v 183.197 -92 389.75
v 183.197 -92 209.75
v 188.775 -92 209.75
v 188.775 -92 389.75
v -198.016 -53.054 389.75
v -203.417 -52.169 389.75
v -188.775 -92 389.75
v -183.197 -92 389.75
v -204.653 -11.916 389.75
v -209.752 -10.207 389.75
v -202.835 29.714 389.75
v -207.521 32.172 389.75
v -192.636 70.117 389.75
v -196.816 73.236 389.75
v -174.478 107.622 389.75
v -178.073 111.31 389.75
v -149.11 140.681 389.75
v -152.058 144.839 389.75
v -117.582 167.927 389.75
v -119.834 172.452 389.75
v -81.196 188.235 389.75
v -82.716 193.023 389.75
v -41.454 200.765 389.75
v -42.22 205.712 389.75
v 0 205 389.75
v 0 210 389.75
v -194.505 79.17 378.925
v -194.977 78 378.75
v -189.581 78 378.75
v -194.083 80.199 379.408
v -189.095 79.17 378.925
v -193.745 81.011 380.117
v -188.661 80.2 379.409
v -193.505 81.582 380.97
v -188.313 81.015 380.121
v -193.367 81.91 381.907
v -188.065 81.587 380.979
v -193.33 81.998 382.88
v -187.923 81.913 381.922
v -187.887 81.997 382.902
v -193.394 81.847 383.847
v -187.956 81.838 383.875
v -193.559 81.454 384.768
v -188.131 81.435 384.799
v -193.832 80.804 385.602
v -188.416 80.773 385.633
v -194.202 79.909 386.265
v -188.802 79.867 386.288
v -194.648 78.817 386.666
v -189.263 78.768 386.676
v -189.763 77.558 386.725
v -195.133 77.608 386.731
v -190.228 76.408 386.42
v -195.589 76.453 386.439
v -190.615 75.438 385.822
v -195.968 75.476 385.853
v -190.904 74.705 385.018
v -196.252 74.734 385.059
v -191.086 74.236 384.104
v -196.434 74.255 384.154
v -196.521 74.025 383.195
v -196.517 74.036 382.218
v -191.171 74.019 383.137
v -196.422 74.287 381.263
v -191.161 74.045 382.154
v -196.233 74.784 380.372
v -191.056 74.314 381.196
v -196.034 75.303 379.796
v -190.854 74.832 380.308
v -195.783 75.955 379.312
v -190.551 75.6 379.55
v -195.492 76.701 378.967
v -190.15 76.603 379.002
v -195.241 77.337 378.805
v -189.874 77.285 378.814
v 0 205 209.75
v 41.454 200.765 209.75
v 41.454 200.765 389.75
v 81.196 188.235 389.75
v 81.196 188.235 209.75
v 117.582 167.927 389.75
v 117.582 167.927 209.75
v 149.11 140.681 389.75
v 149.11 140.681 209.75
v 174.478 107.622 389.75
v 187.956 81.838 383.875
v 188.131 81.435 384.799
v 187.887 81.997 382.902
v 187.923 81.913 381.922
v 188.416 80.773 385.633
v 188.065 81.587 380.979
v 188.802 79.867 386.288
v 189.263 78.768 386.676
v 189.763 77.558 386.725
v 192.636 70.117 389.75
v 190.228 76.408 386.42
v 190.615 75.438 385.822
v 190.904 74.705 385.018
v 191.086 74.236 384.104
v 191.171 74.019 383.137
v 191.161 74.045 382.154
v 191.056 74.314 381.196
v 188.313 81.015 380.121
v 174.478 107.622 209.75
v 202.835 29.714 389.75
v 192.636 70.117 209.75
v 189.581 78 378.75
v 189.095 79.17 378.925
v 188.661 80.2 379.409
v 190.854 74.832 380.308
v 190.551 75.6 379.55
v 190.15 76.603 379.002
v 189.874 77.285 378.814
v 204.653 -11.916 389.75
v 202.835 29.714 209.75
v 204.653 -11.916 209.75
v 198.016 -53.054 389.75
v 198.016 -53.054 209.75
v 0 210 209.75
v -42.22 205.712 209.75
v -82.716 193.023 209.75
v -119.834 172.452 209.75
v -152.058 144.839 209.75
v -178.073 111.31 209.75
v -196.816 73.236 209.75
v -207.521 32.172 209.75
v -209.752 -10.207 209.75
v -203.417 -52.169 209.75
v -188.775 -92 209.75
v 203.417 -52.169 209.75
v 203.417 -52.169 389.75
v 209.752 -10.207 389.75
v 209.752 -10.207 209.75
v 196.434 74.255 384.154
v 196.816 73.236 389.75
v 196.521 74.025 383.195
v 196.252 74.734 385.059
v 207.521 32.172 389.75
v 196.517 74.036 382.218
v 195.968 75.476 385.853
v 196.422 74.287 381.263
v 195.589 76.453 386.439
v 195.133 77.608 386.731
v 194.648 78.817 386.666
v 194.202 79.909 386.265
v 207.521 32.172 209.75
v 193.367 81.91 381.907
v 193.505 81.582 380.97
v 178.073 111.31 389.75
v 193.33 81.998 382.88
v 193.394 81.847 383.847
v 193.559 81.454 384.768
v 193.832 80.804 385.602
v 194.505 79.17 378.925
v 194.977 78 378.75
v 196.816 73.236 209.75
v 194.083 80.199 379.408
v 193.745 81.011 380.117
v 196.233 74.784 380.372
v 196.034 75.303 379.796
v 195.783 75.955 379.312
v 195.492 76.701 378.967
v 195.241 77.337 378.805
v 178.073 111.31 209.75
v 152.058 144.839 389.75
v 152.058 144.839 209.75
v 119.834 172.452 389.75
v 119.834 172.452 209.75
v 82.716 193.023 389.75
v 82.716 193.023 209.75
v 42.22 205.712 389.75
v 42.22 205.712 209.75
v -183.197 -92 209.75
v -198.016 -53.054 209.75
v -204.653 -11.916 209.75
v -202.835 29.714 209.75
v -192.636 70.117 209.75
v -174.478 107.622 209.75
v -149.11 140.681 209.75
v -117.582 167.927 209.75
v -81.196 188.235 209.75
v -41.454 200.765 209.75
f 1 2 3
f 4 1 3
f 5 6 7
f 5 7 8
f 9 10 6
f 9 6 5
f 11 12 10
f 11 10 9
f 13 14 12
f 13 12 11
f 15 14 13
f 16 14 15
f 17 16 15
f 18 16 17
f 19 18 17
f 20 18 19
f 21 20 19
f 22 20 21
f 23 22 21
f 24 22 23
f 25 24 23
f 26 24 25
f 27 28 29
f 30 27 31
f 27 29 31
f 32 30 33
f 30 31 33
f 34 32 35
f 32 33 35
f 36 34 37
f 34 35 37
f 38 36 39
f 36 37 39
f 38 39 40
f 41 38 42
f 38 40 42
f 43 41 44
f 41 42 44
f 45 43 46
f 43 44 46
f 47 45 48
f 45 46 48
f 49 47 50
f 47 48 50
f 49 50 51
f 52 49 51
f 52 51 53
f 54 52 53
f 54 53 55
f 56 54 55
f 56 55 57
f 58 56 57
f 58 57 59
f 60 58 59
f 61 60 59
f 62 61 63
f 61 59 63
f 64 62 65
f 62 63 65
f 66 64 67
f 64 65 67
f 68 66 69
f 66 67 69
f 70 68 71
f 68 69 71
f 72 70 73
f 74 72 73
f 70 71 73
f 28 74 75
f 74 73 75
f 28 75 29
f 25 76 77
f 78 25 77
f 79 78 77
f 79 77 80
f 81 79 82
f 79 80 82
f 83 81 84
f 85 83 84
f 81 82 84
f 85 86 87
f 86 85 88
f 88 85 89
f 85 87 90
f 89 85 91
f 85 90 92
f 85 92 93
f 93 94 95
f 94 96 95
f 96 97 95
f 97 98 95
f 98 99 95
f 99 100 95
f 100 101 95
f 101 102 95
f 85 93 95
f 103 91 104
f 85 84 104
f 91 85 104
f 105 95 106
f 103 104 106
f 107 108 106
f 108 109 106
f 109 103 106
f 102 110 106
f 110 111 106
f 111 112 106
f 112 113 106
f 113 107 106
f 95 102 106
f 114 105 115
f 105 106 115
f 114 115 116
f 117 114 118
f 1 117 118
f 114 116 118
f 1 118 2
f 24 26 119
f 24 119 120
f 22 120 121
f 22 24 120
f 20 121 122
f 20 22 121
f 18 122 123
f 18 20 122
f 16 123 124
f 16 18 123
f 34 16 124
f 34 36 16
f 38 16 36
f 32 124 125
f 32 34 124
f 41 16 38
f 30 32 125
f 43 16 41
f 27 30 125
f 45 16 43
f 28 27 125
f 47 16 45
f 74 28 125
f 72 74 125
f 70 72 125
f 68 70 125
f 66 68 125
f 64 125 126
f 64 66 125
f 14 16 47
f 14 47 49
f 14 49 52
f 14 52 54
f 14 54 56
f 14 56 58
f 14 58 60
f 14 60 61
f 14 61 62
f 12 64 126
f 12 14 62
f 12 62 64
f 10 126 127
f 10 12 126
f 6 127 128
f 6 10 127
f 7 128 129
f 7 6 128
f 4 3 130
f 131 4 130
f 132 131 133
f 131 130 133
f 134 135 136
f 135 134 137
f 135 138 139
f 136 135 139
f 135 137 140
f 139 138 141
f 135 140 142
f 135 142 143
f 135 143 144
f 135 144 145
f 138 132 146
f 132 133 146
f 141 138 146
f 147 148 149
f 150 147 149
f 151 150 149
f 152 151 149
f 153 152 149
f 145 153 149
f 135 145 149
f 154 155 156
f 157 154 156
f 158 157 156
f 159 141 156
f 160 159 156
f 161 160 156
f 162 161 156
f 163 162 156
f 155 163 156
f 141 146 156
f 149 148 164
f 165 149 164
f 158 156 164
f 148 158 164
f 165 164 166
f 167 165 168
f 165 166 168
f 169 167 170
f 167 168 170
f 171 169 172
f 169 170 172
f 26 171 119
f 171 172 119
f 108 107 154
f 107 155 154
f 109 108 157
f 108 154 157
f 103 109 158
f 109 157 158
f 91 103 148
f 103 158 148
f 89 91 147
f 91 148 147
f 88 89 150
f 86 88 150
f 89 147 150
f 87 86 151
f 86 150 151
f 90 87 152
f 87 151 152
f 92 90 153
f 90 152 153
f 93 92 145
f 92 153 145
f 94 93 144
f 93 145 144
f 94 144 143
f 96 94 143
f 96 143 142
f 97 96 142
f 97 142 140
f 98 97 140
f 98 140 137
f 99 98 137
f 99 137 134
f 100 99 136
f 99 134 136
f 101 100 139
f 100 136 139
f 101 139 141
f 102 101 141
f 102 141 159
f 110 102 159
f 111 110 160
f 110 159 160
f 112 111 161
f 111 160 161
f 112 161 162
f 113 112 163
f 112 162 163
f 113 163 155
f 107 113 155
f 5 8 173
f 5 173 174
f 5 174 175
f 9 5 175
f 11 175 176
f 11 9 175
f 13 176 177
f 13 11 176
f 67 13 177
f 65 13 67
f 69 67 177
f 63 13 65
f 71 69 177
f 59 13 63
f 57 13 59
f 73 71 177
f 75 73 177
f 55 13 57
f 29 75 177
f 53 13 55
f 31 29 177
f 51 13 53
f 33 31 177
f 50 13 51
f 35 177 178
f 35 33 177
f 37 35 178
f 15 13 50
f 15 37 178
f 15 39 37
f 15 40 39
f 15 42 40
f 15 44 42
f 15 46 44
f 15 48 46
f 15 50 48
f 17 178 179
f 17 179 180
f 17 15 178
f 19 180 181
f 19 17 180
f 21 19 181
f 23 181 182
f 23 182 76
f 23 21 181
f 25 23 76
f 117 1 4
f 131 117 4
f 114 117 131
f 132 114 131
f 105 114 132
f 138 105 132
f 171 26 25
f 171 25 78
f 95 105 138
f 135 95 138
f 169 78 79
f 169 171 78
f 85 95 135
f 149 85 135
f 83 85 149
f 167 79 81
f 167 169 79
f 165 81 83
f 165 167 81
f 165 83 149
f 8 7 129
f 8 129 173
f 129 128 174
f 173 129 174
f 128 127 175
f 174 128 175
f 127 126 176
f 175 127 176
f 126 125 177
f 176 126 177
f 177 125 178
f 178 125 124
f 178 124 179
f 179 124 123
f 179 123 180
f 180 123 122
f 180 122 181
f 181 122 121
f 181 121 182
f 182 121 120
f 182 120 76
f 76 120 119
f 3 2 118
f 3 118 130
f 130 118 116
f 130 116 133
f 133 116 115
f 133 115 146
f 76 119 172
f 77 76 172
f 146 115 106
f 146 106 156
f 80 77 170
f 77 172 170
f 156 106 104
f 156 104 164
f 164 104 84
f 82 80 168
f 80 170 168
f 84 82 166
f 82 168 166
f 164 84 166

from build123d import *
from build123d.topology import SkipClean

# Parameters (mm, degrees)
SKETCH_1_R          = 210
SKETCH_1_R_2        = 203
EXTRUDE_2_DEPTH     = 174
EXTRUDE_START       = -174
EXTRUDE_4_DEPTH     = 174
CUT_EXTRUDE_1_DEPTH = 654
EXTRUDE_5_DEPTH     = 174
EXTRUDE_6_DEPTH     = 174
EXTRUDE_7_DEPTH     = 174
EXTRUDE_8_DEPTH     = 174
CUT_EXTRUDE_START   = -654
CUT_EXTRUDE_2_DEPTH = 654
SKETCH_10_W         = 20.487801248
SKETCH_10_H         = 174
CUT_EXTRUDE_3_DEPTH = 327
SKETCH_11_W         = 235.63772895
SKETCH_11_H         = 249.192111589
CUT_EXTRUDE_4_DEPTH = 238
EXTRUDE_10_DEPTH    = 180
SKETCH_17_W         = 286.098661696
SKETCH_17_H         = 191.878669743
CUT_EXTRUDE_5_DEPTH = 322
EXTRUDE_11_DEPTH    = 180
SKETCH_20_R         = 4
CUT_EXTRUDE_7_DEPTH = 555.5


with BuildPart() as part:
    # 草图1 → 凸台-拉伸2 (new body)
    with BuildSketch(Plane.XY):
        Circle(SKETCH_1_R)
        Circle(SKETCH_1_R_2, mode=Mode.SUBTRACT)
    extrude(amount=EXTRUDE_2_DEPTH)

    # 草图2 → 凸台-拉伸4 (add)
    with BuildSketch(Plane.XY.offset(174).offset(EXTRUDE_START)):
        with BuildLine():
            Line((-170.735431044, -102), (-173.735431044, -102))
            Line((-173.735431044, -102), (-175.513532242, -102))
            ThreePointArc((-175.513532242, -102), (-174.63092392, -103.50381834), (-173.735431044, -105))
            Line((-173.735431044, -105), (-170.735431044, -105))
            Line((-170.735431044, -105), (-170.735431044, -102))
        make_face()
        with BuildLine():
            ThreePointArc((173.735431044, -105), (174.63092392, -103.50381834), (175.513532242, -102))
            Line((175.513532242, -102), (173.735431044, -102))
            Line((173.735431044, -102), (170.735431044, -102))
            Line((170.735431044, -102), (170.735431044, -105))
            Line((170.735431044, -105), (173.735431044, -105))
        make_face()
    extrude(amount=EXTRUDE_4_DEPTH)

    # 草图3 → 切除-拉伸1 (cut)
    with BuildSketch(Plane.XY.offset(174)):
        Polygon((-170.735431044, -102), (238.333646515, -102), (254.334169784, 272.292523591), (-334.569415043, 221.85110305), (-306.830562533, -102), align=None)
    extrude(amount=-CUT_EXTRUDE_1_DEPTH, mode=Mode.SUBTRACT)

    # 草图5 → 凸台-拉伸5 (add)
    with BuildSketch(Plane.XY.offset(174).offset(EXTRUDE_START)):
        with BuildLine():
            Line((-120, -209.75), (-10.243900624, -209.75))
            ThreePointArc((-10.243900624, -209.75), (-67.755470707, -198.769203322), (-120, -172.336879396))
            Line((-120, -172.336879396), (-120, -209.75))
        make_face()
        with BuildLine():
            ThreePointArc((120, -172.336879396), (67.755470707, -198.769203322), (10.243900624, -209.75))
            Line((10.243900624, -209.75), (120, -209.75))
            Line((120, -209.75), (120, -172.336879396))
        make_face()
    extrude(amount=EXTRUDE_5_DEPTH)

    # 草图6 → 凸台-拉伸6 (add)
    with BuildSketch(Plane.XY.offset(174).offset(EXTRUDE_START)):
        with BuildLine():
            Line((-175.513532242, -102), (-166.195667814, -102))
            ThreePointArc((-166.195667814, -102), (0, -195), (166.195667814, -102))
            Line((166.195667814, -102), (175.513532242, -102))
            ThreePointArc((175.513532242, -102), (0, -203), (-175.513532242, -102))
        make_face()
    extrude(amount=EXTRUDE_6_DEPTH)

    # 草图7 → 凸台-拉伸7 (add)
    with BuildSketch(Plane.XY.offset(174).offset(EXTRUDE_START)):
        with BuildLine():
            Line((-166.933126535, -92), (-166.933126535, -95))
            Line((-166.933126535, -95), (-170.293863659, -95))
            ThreePointArc((-170.293863659, -95), (0, -195), (170.293863659, -95))
            Line((170.293863659, -95), (166.933126535, -95))
            Line((166.933126535, -95), (166.933126535, -92))
            Line((166.933126535, -92), (171.933126535, -92))
            Line((171.933126535, -92), (188.496850106, -92))
            ThreePointArc((188.496850106, -92), (0, -209.75), (-188.496850106, -92))
            Line((-188.496850106, -92), (-171.933126535, -92))
            Line((-171.933126535, -92), (-166.933126535, -92))
        make_face()
    extrude(amount=EXTRUDE_7_DEPTH)

    # 草图8 → 凸台-拉伸8 (add)
    with BuildSketch(Plane(origin=(0, 0, 0), x_dir=(-1, 0, 0), z_dir=(0, 0, -1))):
        with BuildLine():
            Line((166.933126535, -92), (163.933126535, -92))
            Line((163.933126535, -92), (163.933126535, -99))
            Line((163.933126535, -99), (168, -99))
            ThreePointArc((168, -99), (169.158755456, -97.006780447), (170.293863659, -95))
            Line((170.293863659, -95), (166.933126535, -95))
            Line((166.933126535, -95), (166.933126535, -92))
        make_face()
        with BuildLine():
            Line((-166.933126535, -95), (-170.293863659, -95))
            ThreePointArc((-170.293863659, -95), (-169.158755456, -97.006780447), (-168, -99))
            Line((-168, -99), (-163.933126535, -99))
            Line((-163.933126535, -99), (-163.933126535, -92))
            Line((-163.933126535, -92), (-166.933126535, -92))
            Line((-166.933126535, -92), (-166.933126535, -95))
        make_face()
    extrude(amount=-EXTRUDE_8_DEPTH)

    # 草图9 → 切除-拉伸2 (cut)
    with BuildSketch(Plane.XY.offset(174).offset(CUT_EXTRUDE_START)):
        with BuildLine():
            Line((0, -195), (0, -182.225251044))
            Line((0, -182.225251044), (-50, -182.225251044))
            Line((-50, -182.225251044), (-50, -188.48076825))
            ThreePointArc((-50, -188.48076825), (-25.211606368, -193.363323576), (0, -195))
        make_face()
        with BuildLine():
            Line((0, -209.75), (0, -195))
            ThreePointArc((0, -195), (-25.211606368, -193.363323576), (-50, -188.48076825))
            Line((-50, -188.48076825), (-50, -195))
            Line((-50, -195), (-50, -209.75))
            Line((-50, -209.75), (-10.243900624, -209.75))
            Line((-10.243900624, -209.75), (0, -209.75))
        make_face()
        with BuildLine():
            ThreePointArc((50, -188.48076825), (25.211606368, -193.363323576), (0, -195))
            Line((0, -195), (0, -209.75))
            Line((0, -209.75), (10.243900624, -209.75))
            Line((10.243900624, -209.75), (50, -209.75))
            Line((50, -209.75), (50, -195))
            Line((50, -195), (50, -188.48076825))
        make_face()
        with BuildLine():
            Line((50, -182.225251044), (0, -182.225251044))
            Line((0, -182.225251044), (0, -195))
            ThreePointArc((0, -195), (25.211606368, -193.363323576), (50, -188.48076825))
            Line((50, -188.48076825), (50, -182.225251044))
        make_face()
    extrude(amount=CUT_EXTRUDE_2_DEPTH, mode=Mode.SUBTRACT)


with BuildPart() as cut_extrude_2_piece_1:
    # of the separate pieces the step leaves, piece 1, a body of its own (cut_extrude_2_pieces)
    add(part.part.solids().sort_by_distance((-183.564702489, -102, 0))[0])

    # 草图11 → 切除-拉伸4 (cut)
    with BuildSketch(Plane(origin=(0, 0, 0), x_dir=(-1, 0, 0), z_dir=(0, 0, -1))):
        with Locations((136.586471206, -141.23053543)):
            Rectangle(SKETCH_11_W, SKETCH_11_H)
    extrude(amount=-CUT_EXTRUDE_4_DEPTH, mode=Mode.SUBTRACT)


with BuildPart() as cut_extrude_2_piece_2:
    # of the separate pieces the step leaves, piece 2, a body of its own (cut_extrude_2_pieces)
    add(part.part.solids().sort_by_distance((50, -188.48076825, 0))[0])

    # 草图17 → 切除-拉伸5 (cut)
    with BuildSketch(Plane(origin=(0, -92, 0), x_dir=(1, 0, 0), z_dir=(0, 1, 0))):
        with Locations((123.864076708, -90.777636372)):
            Rectangle(SKETCH_17_W, SKETCH_17_H)
    extrude(amount=-CUT_EXTRUDE_5_DEPTH, mode=Mode.SUBTRACT)


with BuildPart() as cut_extrude_2_piece_3:
    # of the separate pieces the step leaves, piece 3, a body of its own (cut_extrude_2_pieces)
    add(part.part.solids().sort_by_distance((10.243900624, -209.75, 0))[0])

    # 草图10 → 切除-拉伸3 (cut, symmetric)
    with BuildSketch(Plane(origin=(0, -209.75, 0), x_dir=(1, 0, 0), z_dir=(0, 1, 0))):
        with Locations((0, -87)):
            Rectangle(SKETCH_10_W, SKETCH_10_H)
    extrude(amount=CUT_EXTRUDE_3_DEPTH, both=True, mode=Mode.SUBTRACT)


with BuildPart() as body_2:
    # 草图14 → 凸台-拉伸10 (new body)
    with BuildSketch(Plane.XY.offset(209.75)):
        with BuildLine():
            Line((0, 210), (0, 205))
            ThreePointArc((0, 205), (174.477792283, 107.622023768), (183.196615689, -92))
            Line((183.196615689, -92), (188.774998345, -92))
            ThreePointArc((188.774998345, -92), (178.073018731, 111.310376875), (0, 210))
        make_face()
    extrude(amount=EXTRUDE_10_DEPTH)

    # 草图18 → 凸台-拉伸11 (add)
    with SkipClean():  # the faces are left unmerged after this step: merging them gives an invalid solid
        with BuildSketch(Plane.XY.offset(389.75)):
            with BuildLine():
                ThreePointArc((0, 210), (-178.073018731, 111.310376875), (-188.774998345, -92))
                Line((-188.774998345, -92), (-183.196615689, -92))
                ThreePointArc((-183.196615689, -92), (-174.477792283, 107.622023768), (0, 205))
                Line((0, 205), (0, 210))
            make_face()
        extrude(amount=-EXTRUDE_11_DEPTH)

    # 草图20 → 切除-拉伸7 (cut, symmetric)
    with SkipClean():  # the faces are left unmerged after this step: merging them gives an invalid solid
        with BuildSketch(Plane(origin=(0, 0, 0), x_dir=(0, 0, -1), z_dir=(1, 0, 0))):
            with Locations((-382.75, 78)):
                Circle(SKETCH_20_R)
        extrude(amount=CUT_EXTRUDE_7_DEPTH, both=True, mode=Mode.SUBTRACT)


solid = body_2.part
